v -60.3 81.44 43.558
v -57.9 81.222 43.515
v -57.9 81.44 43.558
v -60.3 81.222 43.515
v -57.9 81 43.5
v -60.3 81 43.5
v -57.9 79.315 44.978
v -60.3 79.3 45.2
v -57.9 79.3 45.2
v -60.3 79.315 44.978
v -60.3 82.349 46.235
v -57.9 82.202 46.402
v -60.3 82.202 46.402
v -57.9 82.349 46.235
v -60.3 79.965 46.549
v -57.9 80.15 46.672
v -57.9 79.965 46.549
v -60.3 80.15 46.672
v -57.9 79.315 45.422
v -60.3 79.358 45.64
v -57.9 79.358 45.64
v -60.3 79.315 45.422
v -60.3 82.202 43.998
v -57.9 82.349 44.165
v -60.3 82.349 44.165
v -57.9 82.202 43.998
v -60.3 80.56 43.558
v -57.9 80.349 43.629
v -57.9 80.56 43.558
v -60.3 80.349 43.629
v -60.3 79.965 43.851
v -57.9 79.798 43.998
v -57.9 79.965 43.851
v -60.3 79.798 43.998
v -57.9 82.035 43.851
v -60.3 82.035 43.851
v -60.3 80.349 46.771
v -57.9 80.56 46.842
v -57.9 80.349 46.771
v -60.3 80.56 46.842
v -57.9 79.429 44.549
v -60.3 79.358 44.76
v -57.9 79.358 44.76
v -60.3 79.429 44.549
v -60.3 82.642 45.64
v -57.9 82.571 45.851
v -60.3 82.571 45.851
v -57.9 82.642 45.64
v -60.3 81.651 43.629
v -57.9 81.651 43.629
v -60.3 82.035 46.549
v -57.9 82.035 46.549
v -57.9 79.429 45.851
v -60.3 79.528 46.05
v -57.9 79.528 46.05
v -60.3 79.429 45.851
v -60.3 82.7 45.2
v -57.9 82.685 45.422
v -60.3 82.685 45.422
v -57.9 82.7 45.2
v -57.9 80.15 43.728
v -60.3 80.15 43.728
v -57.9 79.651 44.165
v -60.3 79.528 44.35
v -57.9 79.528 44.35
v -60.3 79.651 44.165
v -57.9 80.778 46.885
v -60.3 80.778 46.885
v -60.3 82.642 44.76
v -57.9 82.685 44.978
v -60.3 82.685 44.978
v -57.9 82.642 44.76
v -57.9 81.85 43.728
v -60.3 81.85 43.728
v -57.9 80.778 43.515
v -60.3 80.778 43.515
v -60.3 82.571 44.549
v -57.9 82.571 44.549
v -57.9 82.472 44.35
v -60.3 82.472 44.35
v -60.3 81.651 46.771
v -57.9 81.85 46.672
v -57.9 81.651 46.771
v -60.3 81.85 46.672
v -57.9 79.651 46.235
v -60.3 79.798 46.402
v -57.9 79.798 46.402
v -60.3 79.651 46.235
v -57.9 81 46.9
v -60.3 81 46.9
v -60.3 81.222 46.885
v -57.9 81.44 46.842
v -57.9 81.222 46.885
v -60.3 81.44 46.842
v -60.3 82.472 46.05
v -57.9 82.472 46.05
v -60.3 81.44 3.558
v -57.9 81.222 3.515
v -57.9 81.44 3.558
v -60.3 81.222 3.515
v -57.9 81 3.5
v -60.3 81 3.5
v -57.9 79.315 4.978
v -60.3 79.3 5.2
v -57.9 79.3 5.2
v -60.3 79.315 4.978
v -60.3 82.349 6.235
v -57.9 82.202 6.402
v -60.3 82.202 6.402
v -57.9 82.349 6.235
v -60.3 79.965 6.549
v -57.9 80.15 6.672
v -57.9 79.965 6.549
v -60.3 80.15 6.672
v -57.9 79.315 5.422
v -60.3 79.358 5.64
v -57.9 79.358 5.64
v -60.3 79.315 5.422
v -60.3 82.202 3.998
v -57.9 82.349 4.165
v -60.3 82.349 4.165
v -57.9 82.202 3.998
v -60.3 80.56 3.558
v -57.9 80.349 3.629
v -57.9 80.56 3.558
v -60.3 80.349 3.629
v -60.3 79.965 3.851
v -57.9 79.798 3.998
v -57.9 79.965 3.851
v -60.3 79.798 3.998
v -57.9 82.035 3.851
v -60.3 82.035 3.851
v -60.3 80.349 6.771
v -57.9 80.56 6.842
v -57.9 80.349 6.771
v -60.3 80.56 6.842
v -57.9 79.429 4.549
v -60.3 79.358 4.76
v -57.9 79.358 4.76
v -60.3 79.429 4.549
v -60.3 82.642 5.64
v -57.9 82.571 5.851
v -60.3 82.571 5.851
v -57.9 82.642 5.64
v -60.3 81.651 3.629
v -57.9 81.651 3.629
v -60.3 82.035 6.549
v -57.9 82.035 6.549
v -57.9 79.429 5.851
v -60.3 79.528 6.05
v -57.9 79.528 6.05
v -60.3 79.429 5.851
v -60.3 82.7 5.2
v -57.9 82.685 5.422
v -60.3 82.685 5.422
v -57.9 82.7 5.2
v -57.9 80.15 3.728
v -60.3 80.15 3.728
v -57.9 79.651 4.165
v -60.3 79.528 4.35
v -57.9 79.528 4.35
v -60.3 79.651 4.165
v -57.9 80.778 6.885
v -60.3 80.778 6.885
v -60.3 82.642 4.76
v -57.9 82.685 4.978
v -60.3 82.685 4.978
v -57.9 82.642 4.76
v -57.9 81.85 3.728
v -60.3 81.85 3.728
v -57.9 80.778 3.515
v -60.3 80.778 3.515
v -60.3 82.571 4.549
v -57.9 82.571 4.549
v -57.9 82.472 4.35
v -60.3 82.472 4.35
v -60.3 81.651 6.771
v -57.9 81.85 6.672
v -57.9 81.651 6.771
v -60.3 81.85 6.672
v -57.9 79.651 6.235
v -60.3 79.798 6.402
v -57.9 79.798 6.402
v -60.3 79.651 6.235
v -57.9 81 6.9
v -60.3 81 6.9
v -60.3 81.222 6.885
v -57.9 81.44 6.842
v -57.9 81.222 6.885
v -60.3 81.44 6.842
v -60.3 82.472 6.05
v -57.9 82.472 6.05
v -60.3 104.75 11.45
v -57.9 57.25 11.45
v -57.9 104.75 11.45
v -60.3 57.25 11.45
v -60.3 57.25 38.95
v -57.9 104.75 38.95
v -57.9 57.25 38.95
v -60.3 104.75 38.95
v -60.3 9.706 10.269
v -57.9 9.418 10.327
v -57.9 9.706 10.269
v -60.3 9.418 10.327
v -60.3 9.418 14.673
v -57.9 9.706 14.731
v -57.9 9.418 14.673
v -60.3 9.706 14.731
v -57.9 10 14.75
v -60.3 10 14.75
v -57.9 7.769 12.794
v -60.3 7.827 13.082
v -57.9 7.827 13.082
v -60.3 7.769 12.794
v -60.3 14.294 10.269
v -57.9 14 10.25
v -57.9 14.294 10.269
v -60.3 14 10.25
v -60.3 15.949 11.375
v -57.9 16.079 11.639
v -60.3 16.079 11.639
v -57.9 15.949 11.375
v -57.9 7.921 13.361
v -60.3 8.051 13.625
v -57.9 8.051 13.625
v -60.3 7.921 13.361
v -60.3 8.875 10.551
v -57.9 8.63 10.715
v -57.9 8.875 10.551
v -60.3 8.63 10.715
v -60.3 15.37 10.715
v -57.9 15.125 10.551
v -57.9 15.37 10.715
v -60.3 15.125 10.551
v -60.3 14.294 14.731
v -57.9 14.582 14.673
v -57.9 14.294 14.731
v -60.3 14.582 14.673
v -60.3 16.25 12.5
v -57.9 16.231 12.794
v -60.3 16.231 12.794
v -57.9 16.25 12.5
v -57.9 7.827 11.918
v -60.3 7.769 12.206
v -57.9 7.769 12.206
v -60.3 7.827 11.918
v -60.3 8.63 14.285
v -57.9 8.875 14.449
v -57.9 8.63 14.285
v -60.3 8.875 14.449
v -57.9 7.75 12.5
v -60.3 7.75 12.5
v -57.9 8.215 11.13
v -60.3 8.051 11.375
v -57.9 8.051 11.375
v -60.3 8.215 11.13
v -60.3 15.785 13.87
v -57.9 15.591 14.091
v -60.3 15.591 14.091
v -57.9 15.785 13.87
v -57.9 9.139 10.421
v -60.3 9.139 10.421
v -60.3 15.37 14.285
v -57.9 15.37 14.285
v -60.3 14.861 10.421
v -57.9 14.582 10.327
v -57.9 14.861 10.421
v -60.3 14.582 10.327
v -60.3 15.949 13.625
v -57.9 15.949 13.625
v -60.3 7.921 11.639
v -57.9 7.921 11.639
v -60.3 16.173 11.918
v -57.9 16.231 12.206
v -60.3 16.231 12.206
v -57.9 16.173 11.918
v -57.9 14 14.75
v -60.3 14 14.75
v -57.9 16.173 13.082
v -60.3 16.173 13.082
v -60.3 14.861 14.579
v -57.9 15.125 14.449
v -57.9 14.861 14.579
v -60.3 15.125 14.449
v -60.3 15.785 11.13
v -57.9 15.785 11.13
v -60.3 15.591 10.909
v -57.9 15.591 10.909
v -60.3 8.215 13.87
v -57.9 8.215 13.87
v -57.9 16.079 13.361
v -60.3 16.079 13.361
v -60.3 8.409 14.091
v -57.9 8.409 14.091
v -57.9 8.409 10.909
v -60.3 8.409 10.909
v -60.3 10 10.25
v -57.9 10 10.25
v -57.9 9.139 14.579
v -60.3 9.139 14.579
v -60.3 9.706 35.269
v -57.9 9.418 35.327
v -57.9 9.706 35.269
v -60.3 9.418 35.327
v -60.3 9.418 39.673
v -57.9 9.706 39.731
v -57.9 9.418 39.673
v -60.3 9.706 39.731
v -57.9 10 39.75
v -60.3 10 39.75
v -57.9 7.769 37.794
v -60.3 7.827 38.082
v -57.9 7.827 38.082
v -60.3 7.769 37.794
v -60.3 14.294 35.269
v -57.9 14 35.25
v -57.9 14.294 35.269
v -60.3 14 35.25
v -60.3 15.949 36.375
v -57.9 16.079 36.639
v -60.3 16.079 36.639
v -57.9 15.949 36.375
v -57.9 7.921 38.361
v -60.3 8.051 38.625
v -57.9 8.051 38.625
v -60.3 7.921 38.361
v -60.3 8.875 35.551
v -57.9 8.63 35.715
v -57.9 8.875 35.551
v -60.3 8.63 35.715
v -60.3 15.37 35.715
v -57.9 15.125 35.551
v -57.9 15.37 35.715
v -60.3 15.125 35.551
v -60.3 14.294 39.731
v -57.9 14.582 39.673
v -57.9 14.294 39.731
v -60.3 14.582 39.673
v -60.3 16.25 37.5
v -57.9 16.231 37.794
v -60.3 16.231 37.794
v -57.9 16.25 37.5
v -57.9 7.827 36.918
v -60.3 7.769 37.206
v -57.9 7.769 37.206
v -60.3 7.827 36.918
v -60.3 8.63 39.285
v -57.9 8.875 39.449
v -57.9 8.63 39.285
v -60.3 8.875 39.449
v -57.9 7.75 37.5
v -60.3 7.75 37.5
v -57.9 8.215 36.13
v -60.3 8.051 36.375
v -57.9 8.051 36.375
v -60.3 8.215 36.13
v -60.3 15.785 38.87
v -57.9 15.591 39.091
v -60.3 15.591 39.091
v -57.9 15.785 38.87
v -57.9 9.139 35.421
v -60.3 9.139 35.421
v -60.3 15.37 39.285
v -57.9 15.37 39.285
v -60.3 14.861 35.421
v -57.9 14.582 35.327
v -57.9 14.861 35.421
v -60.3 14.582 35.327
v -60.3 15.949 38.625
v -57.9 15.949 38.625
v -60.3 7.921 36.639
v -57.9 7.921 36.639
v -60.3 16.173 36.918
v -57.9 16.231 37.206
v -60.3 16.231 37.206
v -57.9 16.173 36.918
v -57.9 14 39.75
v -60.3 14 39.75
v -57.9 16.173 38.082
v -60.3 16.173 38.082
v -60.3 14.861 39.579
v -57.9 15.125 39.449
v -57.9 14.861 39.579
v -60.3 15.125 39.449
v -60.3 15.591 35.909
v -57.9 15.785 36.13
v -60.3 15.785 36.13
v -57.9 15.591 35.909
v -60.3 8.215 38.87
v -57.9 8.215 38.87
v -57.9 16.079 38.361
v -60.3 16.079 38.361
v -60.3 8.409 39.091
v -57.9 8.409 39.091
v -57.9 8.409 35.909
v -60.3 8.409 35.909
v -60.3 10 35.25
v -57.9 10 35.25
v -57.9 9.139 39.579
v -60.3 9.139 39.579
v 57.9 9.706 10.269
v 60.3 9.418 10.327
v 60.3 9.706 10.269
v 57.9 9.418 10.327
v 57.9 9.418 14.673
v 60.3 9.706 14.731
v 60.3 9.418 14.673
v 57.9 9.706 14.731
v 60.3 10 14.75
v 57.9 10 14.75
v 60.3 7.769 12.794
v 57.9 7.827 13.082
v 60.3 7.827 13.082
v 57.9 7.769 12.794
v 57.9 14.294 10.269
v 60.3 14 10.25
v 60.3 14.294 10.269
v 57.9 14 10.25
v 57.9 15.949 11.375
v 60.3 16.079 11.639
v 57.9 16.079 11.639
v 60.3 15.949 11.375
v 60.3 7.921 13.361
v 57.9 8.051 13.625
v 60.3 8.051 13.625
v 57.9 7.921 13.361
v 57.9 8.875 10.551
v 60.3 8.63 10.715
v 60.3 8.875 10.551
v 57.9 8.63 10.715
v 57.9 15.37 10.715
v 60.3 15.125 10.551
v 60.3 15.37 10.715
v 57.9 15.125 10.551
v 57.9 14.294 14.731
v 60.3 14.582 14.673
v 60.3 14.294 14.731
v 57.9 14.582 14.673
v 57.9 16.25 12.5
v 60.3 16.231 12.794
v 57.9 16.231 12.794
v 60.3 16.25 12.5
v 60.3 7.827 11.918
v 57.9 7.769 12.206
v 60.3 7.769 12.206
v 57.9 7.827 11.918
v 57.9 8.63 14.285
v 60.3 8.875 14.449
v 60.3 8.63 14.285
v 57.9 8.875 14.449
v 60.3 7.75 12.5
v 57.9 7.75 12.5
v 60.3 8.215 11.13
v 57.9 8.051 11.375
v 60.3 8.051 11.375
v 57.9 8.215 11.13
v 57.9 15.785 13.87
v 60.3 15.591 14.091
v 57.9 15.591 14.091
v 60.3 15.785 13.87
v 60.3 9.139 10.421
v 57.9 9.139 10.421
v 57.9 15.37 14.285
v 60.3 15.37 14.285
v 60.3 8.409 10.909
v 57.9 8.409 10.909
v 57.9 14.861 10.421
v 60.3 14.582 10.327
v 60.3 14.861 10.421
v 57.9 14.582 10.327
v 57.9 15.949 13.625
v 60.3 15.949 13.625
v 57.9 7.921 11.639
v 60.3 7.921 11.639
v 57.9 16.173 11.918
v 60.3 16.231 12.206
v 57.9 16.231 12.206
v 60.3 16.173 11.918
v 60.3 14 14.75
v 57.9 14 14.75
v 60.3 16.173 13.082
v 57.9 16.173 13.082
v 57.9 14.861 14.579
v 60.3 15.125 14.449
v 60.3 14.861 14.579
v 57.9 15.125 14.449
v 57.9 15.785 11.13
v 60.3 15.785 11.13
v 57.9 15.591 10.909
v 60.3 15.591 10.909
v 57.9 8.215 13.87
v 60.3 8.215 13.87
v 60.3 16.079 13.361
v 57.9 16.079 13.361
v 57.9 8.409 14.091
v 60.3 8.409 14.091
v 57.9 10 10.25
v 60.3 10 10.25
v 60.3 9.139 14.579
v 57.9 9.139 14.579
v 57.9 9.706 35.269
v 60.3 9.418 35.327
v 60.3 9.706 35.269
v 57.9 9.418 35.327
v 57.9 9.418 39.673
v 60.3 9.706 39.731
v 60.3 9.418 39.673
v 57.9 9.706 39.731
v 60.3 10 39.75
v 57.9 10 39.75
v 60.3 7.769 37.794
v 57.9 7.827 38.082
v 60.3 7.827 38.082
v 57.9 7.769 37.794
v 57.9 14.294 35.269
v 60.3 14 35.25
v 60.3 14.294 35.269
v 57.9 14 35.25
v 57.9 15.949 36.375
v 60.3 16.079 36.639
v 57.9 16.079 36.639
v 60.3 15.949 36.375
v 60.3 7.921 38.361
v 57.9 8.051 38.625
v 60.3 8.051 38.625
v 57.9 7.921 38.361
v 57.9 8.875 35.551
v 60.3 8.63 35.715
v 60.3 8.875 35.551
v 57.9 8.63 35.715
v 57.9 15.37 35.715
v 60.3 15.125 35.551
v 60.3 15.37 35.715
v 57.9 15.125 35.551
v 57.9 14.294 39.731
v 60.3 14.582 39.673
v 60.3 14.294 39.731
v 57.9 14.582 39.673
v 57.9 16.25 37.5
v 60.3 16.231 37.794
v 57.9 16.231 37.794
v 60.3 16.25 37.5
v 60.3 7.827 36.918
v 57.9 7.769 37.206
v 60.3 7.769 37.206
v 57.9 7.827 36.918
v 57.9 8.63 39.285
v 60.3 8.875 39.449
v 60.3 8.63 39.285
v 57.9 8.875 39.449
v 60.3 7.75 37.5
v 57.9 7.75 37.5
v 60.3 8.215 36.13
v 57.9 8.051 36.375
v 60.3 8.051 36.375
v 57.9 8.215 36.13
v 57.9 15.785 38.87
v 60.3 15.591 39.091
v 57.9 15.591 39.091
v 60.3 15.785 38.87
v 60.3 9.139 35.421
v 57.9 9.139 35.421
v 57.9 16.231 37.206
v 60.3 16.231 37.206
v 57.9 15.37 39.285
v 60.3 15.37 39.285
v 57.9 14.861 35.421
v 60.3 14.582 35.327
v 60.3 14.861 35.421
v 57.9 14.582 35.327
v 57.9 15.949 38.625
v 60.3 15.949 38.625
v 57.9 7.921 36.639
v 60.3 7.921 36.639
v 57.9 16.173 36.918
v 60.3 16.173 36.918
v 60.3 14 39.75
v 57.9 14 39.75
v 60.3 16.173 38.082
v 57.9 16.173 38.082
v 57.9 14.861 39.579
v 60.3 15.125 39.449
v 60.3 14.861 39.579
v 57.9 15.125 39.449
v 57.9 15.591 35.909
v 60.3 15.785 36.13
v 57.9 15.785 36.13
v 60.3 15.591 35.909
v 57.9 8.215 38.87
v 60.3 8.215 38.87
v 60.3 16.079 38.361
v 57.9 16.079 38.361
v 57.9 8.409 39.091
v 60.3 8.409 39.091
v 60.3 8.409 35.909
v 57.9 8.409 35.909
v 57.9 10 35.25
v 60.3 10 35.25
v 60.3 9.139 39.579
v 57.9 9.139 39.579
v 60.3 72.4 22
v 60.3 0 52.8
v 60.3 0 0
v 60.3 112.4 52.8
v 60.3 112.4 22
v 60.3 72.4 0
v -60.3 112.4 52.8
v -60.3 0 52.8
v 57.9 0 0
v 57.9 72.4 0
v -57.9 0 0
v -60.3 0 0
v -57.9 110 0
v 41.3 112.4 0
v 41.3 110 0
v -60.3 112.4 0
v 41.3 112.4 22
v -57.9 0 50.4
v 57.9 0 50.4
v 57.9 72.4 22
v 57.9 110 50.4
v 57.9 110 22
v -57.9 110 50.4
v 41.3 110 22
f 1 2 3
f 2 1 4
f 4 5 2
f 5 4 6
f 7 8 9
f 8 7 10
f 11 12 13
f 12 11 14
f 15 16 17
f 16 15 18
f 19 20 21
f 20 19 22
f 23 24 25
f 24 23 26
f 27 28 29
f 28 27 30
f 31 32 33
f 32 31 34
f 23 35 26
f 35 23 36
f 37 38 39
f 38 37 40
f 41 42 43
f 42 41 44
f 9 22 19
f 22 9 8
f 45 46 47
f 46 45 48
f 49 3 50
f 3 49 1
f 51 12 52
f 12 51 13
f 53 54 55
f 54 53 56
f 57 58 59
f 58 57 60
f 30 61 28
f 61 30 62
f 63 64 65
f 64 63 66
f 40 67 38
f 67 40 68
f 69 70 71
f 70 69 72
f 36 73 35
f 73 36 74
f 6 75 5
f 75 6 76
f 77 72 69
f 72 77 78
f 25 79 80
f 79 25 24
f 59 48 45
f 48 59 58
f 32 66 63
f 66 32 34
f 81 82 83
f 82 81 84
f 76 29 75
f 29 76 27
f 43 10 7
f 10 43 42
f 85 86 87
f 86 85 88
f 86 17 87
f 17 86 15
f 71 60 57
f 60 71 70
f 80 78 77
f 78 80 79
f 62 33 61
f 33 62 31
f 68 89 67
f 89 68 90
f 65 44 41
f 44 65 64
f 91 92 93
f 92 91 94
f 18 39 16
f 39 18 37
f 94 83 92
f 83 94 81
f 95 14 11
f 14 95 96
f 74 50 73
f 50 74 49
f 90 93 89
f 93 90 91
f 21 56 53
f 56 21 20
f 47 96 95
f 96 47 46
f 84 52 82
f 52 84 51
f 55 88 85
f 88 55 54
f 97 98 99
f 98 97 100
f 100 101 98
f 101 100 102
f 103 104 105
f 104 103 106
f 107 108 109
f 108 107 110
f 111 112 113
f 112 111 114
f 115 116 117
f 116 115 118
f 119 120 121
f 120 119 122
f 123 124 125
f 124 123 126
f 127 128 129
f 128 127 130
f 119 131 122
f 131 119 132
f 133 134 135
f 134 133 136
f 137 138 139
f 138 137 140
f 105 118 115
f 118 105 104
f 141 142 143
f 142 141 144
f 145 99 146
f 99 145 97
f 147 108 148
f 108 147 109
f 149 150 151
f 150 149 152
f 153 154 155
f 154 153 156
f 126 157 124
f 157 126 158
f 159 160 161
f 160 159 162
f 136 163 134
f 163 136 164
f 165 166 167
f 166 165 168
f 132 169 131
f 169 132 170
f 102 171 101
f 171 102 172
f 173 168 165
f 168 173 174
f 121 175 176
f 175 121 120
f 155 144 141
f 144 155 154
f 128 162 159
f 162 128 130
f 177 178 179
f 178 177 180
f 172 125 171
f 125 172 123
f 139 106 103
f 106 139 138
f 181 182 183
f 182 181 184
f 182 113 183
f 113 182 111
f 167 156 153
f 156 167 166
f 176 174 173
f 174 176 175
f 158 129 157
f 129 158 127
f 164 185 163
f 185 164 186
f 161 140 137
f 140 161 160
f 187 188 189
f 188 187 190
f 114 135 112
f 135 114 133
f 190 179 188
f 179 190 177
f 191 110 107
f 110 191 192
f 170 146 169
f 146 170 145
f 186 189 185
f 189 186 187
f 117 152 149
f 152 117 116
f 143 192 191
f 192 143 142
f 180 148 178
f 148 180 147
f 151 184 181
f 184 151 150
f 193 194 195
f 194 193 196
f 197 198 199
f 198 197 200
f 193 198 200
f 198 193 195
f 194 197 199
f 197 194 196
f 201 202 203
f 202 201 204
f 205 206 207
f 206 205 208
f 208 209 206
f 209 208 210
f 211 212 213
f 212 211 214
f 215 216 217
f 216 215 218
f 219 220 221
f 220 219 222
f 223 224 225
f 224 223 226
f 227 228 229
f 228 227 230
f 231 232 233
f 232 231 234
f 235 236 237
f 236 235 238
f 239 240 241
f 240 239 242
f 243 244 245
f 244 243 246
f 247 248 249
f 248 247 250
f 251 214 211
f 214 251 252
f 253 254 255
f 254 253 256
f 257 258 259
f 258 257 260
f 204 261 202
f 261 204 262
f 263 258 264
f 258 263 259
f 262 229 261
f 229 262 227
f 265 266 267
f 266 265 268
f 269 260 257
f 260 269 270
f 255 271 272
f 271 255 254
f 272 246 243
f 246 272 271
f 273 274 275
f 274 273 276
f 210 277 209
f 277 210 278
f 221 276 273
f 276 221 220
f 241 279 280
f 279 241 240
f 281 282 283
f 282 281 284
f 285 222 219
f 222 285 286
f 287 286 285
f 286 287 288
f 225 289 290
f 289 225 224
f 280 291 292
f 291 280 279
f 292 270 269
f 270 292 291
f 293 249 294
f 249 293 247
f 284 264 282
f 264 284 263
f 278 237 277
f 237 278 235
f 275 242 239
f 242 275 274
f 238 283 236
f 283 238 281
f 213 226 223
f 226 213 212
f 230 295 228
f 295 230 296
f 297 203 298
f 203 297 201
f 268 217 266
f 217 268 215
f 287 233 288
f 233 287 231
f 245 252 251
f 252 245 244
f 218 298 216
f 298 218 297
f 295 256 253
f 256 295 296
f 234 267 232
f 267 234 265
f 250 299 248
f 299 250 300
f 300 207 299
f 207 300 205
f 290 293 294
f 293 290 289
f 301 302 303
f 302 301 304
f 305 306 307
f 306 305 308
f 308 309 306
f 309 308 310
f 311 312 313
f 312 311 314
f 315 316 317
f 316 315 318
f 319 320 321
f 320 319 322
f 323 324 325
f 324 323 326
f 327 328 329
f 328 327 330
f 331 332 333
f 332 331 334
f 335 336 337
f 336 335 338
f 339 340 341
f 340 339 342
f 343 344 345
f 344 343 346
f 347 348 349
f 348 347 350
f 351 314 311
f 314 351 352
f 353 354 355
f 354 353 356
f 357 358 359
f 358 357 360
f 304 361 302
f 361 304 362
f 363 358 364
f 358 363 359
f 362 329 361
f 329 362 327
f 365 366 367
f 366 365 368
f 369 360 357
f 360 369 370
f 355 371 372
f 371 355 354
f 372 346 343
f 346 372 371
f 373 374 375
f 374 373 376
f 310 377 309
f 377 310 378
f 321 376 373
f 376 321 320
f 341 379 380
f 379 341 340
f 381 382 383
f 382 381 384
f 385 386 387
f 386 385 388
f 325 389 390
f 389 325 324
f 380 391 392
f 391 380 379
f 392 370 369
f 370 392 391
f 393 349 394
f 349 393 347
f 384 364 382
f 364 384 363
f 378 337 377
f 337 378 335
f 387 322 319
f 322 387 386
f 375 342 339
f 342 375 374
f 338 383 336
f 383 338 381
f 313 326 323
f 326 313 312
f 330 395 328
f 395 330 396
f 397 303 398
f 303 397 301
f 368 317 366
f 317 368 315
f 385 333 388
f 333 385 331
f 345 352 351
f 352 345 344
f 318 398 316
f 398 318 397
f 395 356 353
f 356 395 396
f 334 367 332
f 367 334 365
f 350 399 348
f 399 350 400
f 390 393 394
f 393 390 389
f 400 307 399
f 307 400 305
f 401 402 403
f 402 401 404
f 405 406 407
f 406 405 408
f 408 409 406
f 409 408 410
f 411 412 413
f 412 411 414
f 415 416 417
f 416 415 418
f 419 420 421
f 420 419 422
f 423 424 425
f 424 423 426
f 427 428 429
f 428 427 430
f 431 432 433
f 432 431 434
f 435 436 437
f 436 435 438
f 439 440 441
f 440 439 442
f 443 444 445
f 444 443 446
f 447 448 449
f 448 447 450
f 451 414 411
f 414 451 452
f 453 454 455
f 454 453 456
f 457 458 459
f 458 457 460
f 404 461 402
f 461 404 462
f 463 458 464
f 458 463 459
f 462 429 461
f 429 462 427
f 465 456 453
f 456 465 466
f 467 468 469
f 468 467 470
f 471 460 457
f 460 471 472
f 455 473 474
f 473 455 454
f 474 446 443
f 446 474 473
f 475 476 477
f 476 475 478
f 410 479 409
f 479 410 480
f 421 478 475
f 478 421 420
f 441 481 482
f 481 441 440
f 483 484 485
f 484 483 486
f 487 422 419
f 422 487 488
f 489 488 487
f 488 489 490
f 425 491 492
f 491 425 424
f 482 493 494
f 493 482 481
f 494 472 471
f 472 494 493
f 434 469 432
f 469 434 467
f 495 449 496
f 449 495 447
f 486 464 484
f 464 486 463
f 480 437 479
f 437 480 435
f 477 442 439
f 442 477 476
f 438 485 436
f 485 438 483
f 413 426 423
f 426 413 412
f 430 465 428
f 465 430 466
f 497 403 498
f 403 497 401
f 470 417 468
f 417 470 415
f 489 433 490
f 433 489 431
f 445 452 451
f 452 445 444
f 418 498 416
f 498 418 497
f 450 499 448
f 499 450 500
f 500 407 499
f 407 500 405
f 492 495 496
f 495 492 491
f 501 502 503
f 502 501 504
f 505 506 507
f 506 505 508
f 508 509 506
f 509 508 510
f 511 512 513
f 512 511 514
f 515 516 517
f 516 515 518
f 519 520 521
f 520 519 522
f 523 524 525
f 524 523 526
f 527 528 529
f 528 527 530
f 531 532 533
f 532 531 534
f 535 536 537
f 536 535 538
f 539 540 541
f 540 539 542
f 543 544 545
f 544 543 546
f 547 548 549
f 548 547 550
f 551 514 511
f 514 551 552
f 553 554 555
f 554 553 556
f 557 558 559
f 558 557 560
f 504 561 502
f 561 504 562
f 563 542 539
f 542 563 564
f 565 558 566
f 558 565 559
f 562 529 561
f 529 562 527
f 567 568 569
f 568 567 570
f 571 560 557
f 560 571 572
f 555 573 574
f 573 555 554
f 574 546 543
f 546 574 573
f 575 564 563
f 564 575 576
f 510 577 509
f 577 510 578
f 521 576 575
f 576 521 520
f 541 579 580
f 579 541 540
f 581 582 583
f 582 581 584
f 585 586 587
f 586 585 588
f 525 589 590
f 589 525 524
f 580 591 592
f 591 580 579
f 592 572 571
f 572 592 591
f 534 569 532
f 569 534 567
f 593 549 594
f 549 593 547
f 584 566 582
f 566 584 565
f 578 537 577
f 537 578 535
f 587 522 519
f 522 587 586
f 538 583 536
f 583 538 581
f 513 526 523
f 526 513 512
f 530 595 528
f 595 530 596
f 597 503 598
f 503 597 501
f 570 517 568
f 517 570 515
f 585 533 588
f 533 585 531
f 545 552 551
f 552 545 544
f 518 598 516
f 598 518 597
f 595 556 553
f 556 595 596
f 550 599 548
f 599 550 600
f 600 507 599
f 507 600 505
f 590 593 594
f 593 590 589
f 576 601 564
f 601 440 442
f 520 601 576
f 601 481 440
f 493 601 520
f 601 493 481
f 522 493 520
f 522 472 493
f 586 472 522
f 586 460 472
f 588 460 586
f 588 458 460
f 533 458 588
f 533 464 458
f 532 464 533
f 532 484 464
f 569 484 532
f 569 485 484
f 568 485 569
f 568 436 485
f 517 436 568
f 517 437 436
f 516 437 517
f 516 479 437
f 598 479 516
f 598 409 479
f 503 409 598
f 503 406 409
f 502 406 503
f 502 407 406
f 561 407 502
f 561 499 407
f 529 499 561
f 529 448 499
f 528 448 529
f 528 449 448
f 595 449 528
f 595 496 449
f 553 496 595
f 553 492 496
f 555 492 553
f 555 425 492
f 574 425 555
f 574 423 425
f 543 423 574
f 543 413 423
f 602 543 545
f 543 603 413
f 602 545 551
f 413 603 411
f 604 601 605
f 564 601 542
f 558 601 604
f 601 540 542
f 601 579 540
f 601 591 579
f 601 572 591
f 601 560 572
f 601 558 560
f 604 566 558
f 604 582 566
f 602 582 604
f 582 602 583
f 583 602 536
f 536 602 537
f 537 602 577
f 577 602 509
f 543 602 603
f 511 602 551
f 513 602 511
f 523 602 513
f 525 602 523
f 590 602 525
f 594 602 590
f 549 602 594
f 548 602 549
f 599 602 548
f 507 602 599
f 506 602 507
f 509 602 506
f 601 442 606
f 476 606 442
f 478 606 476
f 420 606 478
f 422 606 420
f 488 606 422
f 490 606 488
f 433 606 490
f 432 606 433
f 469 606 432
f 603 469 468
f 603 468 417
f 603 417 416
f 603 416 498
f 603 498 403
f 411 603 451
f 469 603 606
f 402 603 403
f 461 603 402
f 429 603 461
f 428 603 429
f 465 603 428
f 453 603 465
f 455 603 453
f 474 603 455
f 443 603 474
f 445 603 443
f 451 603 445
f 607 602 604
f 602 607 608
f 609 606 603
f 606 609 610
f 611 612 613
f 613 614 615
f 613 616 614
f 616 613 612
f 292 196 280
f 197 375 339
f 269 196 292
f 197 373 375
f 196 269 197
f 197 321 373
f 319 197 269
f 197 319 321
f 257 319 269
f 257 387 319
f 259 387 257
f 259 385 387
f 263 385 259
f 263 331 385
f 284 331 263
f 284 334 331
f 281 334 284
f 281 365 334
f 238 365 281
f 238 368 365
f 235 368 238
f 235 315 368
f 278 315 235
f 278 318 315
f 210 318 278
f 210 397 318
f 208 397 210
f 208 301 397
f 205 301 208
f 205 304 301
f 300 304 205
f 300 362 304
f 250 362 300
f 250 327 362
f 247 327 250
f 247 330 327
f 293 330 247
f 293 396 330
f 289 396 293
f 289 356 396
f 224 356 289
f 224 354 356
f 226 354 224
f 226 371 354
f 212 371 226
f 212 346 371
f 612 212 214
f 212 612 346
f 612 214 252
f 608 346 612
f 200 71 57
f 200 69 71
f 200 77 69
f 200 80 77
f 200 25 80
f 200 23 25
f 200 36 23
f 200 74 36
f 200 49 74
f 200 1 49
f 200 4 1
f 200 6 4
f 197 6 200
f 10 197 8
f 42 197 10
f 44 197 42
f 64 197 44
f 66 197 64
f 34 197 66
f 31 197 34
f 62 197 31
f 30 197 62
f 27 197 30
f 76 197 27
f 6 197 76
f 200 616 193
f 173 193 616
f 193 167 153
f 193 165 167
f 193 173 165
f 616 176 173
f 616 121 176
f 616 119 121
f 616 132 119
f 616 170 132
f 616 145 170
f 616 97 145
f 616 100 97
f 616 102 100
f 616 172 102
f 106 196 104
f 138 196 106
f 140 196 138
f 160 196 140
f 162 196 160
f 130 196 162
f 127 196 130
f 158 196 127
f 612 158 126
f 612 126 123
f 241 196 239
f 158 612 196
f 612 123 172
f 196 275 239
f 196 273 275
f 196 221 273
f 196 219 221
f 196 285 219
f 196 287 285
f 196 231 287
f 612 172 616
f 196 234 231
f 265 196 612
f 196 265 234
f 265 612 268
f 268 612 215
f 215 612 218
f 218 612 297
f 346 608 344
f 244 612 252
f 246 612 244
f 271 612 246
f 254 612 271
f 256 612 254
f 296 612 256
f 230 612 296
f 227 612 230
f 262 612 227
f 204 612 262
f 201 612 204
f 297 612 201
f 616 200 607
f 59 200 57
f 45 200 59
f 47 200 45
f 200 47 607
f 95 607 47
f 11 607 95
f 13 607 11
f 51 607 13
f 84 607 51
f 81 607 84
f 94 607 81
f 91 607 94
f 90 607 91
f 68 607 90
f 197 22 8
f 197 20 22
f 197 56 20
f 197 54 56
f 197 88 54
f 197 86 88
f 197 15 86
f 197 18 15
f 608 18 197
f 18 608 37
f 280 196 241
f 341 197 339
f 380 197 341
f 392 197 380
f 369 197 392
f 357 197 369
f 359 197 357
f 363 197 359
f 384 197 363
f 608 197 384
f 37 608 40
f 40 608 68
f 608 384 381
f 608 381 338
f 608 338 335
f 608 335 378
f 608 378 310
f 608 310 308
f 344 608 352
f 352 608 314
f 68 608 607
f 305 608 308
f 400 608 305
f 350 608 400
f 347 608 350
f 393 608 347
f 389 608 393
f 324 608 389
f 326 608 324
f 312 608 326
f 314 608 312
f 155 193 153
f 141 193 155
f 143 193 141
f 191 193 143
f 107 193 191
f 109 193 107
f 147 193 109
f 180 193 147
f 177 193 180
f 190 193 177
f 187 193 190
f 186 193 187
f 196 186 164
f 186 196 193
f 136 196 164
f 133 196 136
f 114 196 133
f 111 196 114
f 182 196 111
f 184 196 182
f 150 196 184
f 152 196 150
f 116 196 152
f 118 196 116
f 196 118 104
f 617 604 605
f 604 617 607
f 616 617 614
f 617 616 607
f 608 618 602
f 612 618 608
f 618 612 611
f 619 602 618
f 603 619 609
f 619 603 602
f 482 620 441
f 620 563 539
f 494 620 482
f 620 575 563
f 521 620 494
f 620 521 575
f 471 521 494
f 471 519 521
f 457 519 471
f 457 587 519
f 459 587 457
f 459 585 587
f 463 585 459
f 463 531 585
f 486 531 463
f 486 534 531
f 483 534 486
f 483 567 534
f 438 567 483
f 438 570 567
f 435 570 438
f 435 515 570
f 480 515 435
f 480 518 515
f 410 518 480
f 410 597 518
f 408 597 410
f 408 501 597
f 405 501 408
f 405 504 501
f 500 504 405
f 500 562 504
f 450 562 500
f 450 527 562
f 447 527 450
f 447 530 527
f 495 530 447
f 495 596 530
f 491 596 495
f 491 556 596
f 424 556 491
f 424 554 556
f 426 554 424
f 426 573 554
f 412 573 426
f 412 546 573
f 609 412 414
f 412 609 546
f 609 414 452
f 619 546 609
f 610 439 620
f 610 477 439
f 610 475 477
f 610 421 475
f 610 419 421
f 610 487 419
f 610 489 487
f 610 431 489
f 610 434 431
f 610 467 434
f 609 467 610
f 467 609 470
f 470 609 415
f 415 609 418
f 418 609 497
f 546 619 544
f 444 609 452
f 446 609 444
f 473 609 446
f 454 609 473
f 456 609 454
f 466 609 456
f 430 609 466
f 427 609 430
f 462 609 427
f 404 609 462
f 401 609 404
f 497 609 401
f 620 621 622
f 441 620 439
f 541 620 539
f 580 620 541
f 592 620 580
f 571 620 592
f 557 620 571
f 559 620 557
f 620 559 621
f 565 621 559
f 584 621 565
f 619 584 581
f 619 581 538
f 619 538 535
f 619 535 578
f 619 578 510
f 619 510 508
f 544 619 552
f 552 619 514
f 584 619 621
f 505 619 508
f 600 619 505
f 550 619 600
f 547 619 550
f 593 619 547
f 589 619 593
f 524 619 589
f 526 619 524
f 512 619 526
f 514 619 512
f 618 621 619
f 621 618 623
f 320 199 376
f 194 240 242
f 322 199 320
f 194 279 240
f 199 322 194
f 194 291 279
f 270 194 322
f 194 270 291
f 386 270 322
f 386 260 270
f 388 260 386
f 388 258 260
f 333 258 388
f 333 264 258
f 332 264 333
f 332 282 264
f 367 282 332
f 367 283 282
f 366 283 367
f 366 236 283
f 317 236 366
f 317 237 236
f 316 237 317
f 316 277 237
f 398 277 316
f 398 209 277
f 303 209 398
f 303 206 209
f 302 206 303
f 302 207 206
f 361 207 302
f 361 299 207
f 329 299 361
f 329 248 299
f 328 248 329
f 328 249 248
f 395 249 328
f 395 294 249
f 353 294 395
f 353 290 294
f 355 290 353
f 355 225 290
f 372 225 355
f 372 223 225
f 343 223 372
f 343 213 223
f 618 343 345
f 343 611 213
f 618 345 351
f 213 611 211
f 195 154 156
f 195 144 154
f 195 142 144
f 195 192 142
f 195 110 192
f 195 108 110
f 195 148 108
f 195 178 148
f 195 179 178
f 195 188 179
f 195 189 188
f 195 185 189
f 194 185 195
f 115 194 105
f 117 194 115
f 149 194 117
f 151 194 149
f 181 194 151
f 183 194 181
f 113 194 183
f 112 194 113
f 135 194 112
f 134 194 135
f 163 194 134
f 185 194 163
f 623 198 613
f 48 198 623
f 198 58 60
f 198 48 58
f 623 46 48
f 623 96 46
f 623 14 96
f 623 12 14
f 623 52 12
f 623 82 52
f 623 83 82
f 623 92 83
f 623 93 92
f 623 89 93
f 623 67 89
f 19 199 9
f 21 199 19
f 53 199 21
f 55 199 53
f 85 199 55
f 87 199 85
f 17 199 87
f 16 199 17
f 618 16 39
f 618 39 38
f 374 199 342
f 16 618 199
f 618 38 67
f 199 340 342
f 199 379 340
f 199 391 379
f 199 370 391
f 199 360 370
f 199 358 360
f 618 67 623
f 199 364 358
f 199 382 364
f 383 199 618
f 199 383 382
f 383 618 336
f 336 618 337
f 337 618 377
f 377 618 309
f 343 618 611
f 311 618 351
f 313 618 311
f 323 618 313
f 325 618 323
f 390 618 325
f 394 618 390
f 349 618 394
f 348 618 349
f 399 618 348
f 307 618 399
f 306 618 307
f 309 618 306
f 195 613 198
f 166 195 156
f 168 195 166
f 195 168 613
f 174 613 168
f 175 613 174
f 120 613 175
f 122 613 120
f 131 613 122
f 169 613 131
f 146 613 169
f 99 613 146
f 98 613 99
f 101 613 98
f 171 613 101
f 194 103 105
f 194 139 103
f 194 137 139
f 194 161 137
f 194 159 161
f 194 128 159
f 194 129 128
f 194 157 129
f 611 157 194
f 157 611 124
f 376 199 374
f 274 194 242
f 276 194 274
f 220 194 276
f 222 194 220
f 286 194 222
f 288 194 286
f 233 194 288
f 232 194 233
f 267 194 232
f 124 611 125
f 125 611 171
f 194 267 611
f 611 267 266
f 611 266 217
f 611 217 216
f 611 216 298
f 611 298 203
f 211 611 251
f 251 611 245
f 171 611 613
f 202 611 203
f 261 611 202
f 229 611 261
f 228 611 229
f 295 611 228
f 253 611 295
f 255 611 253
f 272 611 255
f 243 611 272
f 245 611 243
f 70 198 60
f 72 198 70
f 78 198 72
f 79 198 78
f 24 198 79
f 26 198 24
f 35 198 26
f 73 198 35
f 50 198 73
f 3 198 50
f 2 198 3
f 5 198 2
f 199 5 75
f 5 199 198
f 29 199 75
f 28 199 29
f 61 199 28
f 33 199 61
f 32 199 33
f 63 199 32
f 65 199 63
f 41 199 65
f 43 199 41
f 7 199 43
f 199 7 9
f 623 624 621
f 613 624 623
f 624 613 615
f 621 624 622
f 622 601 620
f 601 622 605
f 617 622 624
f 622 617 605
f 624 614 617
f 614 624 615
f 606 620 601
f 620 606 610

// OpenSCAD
// Redrex S-360-24 terminal-end cover for AM8 (PSU mounted vertically on the
// right-side Z 2040, terminal end DOWN, mounting face against the extrusion).
// IEC switch/fuse/C14 module on the BACK face (narrow side toward the rear of the printer).
// Side facing the extrusion is open for wiring into the frame.
// All dimensions in mm. Edit parameters, F6, export STL.
//
// Model axes (as installed):
//   Y = along the PSU; Y=0 is the PSU's terminal end, +Y points DOWN toward the base
//   Z = outward from the extrusion; Z=0 is the PSU mounting face (open side)
//   X = front/back; -X is the BACK of the printer
// Exported STL: rotated so the down-facing end sits on the bed, i.e. same as installed.

/* [PSU] */
psu_w   = 115;
psu_h   = 50;
clr     = 0.4;

/* [Cover] */
wall    = 2.4;
overlap = 52;    // how far the cover reaches up the PSU (open side faces the plate, so no clash)
ext     = 58;    // how far it hangs below the PSU end (needs ~56 for the IEC module)

/* [Side retaining screws: M4 into PSU side holes] */
side_screw_y   = -40;          // PSU side holes: 40 mm up from the terminal end (as seated)
side_screw_zs  = [12.5, 37.5]; // two holes across each 50 mm side face
side_slot_len  = 8.5;          // vertical slot = 4 mm of up/down play
side_screw_d   = 4.5;

/* [IEC module] */
iec_cut_long   = 47.5;
iec_cut_short  = 27.5;
iec_screw_sp   = 40;    // screw spacing, across the short side
iec_screw_d    = 3.4;
iec_side       = -1;    // -1 = back of printer, +1 = front (flip if your mount is mirrored)

/* [Corner notch for HBLFSNF5 brackets at the foot of the 2040] */
notch_w = 19;   // back from the front (2040-side) face
notch_h = 40;   // up from the bottom
notch_d = 22;   // in from the open side (bracket's longest leg ~20 + 2 clearance)

$fn = 48;

iw = psu_w + 2*clr;
ih = psu_h + clr;
ow = iw + 2*wall;
oh = ih + wall;
od = overlap + ext + wall;

module iec_cutout() {
    // long axis runs along Y (vertical when installed), screws across Z
    translate([iec_side*(iw/2 + wall/2), overlap + ext/2, ih/2])
    rotate([0, 90, 0]) {
        cube([iec_cut_short, iec_cut_long, 3*wall], center = true);
        for (s = [-1, 1])
            translate([s*iec_screw_sp/2, 0, 0])
                cylinder(d = iec_screw_d, h = 3*wall, center = true);
    }
}

module side_slots() {
    for (s = [-1, 1], hz = side_screw_zs)
        translate([s*(iw/2 + wall/2), overlap + side_screw_y, hz])
        rotate([0, 90, 0])
        hull() for (d = [-1, 1])
            translate([0, d*(side_slot_len - side_screw_d)/2, 0])
                cylinder(d = side_screw_d, h = 3*wall, center = true);
}

difference() {
    translate([-ow/2, 0, 0]) cube([ow, od, oh]);
    translate([-iw/2, -1, -1]) cube([iw, overlap + ext + 1, ih + 1]);  // open top (PSU) + open extrusion side
    iec_cutout();
    side_slots();
    // notch around the 2040 corner bracket (bottom front corner, from the open side)
    translate([ow/2 - notch_w, od - notch_h, -5]) cube([notch_w + 1, notch_h + 1, notch_d + 5]);
}
